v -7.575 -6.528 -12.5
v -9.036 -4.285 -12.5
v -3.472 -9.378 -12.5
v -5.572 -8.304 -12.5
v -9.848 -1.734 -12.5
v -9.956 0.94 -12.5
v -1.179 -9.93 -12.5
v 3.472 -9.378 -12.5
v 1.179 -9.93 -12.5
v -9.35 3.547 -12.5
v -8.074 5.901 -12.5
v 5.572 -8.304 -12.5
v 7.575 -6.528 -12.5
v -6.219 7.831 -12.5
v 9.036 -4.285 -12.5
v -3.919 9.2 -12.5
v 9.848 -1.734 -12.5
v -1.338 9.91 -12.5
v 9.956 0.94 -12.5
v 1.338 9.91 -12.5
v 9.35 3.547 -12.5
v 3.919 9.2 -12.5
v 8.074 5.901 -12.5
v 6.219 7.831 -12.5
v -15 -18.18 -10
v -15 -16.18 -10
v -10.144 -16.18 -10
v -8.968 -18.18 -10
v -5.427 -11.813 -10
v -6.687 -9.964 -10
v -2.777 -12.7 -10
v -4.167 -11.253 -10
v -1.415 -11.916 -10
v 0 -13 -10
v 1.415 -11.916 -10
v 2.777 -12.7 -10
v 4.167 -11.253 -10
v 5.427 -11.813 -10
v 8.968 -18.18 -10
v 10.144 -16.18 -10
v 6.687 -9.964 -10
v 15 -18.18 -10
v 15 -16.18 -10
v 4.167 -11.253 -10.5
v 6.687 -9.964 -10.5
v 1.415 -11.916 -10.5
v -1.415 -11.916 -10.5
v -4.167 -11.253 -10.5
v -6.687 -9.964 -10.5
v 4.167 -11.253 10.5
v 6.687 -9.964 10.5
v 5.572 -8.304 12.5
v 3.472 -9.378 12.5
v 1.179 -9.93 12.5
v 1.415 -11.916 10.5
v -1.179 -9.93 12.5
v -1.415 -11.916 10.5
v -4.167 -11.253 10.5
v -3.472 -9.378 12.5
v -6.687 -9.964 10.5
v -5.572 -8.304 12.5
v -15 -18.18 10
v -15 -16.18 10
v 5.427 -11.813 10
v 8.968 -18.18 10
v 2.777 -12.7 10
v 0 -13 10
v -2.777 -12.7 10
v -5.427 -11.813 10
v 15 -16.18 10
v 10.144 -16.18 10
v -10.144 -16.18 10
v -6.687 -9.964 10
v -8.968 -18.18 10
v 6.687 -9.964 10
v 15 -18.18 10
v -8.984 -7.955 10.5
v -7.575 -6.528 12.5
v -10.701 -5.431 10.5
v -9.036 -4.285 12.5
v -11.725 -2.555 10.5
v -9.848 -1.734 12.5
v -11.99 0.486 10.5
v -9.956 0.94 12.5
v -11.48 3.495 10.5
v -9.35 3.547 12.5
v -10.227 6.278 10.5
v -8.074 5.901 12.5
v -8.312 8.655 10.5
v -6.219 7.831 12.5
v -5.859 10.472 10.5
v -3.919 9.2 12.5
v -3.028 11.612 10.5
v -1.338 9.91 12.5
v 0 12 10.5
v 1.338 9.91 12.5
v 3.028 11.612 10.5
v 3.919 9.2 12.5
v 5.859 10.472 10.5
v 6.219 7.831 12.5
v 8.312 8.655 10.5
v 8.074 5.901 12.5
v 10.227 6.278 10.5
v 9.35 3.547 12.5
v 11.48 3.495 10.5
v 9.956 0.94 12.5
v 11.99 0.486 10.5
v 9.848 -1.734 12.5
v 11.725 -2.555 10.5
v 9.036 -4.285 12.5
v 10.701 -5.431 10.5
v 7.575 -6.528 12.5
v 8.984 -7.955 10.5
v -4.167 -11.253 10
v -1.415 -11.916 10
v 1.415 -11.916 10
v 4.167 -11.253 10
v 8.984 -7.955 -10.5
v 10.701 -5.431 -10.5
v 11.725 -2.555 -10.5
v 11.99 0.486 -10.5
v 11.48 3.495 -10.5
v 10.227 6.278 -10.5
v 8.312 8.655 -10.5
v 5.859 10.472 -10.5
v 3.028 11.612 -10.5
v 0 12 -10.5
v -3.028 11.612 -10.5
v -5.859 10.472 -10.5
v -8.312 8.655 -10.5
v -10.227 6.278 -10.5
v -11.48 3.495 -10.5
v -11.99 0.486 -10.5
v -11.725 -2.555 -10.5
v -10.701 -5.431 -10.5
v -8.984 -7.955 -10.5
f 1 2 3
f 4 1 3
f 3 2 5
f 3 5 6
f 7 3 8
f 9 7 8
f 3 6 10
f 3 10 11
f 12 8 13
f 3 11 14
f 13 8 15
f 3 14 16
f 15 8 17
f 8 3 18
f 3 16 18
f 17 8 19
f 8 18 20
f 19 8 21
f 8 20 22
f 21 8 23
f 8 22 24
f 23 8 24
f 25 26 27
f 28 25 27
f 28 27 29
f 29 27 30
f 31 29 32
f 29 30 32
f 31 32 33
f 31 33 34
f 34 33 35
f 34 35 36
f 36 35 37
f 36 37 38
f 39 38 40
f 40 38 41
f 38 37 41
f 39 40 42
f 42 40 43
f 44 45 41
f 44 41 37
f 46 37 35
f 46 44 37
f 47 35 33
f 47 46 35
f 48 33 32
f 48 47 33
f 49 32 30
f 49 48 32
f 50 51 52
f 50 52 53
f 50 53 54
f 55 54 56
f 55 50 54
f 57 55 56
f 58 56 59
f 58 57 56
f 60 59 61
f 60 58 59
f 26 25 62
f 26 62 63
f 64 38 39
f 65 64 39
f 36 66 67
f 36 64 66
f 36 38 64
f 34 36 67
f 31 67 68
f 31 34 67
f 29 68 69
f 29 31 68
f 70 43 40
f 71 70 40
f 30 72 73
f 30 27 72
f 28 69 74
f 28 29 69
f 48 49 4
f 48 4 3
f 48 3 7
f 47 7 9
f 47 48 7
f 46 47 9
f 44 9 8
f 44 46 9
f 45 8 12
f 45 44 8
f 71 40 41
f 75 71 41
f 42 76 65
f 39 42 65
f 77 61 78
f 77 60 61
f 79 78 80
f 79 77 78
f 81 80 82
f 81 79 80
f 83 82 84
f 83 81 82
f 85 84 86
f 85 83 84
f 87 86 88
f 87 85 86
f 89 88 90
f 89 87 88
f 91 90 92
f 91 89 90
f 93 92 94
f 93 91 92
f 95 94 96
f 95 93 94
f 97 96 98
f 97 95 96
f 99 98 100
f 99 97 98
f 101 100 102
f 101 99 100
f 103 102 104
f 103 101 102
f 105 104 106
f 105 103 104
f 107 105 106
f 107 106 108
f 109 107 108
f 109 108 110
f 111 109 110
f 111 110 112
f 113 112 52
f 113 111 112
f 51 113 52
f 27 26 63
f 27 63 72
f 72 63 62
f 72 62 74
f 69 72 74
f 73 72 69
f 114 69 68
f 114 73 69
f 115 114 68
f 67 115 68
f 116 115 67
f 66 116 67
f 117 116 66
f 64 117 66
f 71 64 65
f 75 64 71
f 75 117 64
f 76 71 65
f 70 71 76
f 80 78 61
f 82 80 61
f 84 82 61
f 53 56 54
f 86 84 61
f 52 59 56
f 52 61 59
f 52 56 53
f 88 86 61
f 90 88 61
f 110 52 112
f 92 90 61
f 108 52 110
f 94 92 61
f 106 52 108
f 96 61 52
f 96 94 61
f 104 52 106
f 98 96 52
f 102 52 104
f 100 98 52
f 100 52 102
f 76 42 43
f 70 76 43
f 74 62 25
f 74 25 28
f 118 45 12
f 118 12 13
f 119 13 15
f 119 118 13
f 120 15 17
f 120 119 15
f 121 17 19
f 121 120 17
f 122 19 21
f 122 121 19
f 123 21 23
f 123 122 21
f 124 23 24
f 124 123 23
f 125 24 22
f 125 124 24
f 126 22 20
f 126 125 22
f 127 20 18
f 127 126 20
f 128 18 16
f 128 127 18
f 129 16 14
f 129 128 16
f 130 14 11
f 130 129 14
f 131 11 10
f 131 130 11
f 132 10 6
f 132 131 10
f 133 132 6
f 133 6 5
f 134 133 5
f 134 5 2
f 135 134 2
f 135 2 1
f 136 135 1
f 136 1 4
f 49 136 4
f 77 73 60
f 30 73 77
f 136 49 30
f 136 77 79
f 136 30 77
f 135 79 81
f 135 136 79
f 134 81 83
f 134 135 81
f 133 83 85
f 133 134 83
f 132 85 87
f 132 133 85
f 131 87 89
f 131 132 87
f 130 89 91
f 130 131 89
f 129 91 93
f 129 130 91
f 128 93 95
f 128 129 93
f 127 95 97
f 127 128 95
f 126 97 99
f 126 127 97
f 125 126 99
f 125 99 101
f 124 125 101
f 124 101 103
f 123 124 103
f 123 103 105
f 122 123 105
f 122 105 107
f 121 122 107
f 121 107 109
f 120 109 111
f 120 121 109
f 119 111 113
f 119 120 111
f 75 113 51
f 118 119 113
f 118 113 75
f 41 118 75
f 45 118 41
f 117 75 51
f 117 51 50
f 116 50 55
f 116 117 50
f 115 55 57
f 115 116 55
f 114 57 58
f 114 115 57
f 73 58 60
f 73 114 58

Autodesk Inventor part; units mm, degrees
ref_plane "YZ Plane" through (0, 0, 0) normal (1, 0, 0) x (0, 1, 0)
ref_plane "XZ Plane" through (0, 0, 0) normal (0, 1, 0) x (-1, 0, 0)
ref_plane "XY Plane" through (0, 0, 0) normal (0, 0, 1) x (1, 0, 0)
sketch "Sketch1" plane through (0, 0, 0) normal (0, 0, 1) x (1, 0, 0)
  line L0 (0, 0) -> (0, -18.18) construction
  line L1 (0, -18.18) -> (-15, -18.18) construction
  line L2 (-15, -18.18) -> (-15, -16.18)
  line L3 (-15, -16.18) -> (-9, -16.18) construction
  line L4 (-9, -16.18) -> (0, 0) construction
  line L5 (-10.1443, -16.18) -> (-6.6868, -9.9643)
  line L6 (-5.4267, -11.8132) -> (-8.9682, -18.18)
  line L7 (-15, -16.18) -> (-10.1443, -16.18)
  line L8 (-15, -18.18) -> (-8.9682, -18.18)
  line L9 (15, -18.18) -> (15, -16.18)
  line L10 (15, -16.18) -> (9, -16.18) construction
  line L11 (10.1443, -16.18) -> (6.6868, -9.9643)
  line L12 (5.4267, -11.8132) -> (8.9682, -18.18)
  line L13 (15, -16.18) -> (10.1443, -16.18)
  line L14 (15, -18.18) -> (8.9682, -18.18)
  arc A0 (-5.4267, -11.8132) -> (5.4267, -11.8132) centre (0, 0) ccw
  arc A1 (6.6868, -9.9643) -> (-6.6868, -9.9643) centre (0, 0) ccw
  dimension "d1" = 15
  dimension "d2" = 18.18
  dimension "d3" = 2
  dimension "d4" = 6
  dimension "d5" = 1
  dimension "d6" = 2
  dimension "d9" = 12
  dimension "d10" = 13
extrude "Extrusion1" add sketch "Sketch1" along normal mid plane 20
sketch "Sketch2" plane through (0, 0, 0) normal (0, 0, 1) x (1, 0, 0)
  arc A0 (6.6868, -9.9643) -> (-6.6868, -9.9643) centre (0, 0) ccw projected
  circle A1 centre (0, 0) radius 12
extrude "Extrusion2" add sketch "Sketch2" along normal mid plane 25
chamfer "Chamfer1" distance 2 angle 45 2 edges at (-12, 0, 12.5) (-12, 0, -12.5)
properties part number "Motor"
